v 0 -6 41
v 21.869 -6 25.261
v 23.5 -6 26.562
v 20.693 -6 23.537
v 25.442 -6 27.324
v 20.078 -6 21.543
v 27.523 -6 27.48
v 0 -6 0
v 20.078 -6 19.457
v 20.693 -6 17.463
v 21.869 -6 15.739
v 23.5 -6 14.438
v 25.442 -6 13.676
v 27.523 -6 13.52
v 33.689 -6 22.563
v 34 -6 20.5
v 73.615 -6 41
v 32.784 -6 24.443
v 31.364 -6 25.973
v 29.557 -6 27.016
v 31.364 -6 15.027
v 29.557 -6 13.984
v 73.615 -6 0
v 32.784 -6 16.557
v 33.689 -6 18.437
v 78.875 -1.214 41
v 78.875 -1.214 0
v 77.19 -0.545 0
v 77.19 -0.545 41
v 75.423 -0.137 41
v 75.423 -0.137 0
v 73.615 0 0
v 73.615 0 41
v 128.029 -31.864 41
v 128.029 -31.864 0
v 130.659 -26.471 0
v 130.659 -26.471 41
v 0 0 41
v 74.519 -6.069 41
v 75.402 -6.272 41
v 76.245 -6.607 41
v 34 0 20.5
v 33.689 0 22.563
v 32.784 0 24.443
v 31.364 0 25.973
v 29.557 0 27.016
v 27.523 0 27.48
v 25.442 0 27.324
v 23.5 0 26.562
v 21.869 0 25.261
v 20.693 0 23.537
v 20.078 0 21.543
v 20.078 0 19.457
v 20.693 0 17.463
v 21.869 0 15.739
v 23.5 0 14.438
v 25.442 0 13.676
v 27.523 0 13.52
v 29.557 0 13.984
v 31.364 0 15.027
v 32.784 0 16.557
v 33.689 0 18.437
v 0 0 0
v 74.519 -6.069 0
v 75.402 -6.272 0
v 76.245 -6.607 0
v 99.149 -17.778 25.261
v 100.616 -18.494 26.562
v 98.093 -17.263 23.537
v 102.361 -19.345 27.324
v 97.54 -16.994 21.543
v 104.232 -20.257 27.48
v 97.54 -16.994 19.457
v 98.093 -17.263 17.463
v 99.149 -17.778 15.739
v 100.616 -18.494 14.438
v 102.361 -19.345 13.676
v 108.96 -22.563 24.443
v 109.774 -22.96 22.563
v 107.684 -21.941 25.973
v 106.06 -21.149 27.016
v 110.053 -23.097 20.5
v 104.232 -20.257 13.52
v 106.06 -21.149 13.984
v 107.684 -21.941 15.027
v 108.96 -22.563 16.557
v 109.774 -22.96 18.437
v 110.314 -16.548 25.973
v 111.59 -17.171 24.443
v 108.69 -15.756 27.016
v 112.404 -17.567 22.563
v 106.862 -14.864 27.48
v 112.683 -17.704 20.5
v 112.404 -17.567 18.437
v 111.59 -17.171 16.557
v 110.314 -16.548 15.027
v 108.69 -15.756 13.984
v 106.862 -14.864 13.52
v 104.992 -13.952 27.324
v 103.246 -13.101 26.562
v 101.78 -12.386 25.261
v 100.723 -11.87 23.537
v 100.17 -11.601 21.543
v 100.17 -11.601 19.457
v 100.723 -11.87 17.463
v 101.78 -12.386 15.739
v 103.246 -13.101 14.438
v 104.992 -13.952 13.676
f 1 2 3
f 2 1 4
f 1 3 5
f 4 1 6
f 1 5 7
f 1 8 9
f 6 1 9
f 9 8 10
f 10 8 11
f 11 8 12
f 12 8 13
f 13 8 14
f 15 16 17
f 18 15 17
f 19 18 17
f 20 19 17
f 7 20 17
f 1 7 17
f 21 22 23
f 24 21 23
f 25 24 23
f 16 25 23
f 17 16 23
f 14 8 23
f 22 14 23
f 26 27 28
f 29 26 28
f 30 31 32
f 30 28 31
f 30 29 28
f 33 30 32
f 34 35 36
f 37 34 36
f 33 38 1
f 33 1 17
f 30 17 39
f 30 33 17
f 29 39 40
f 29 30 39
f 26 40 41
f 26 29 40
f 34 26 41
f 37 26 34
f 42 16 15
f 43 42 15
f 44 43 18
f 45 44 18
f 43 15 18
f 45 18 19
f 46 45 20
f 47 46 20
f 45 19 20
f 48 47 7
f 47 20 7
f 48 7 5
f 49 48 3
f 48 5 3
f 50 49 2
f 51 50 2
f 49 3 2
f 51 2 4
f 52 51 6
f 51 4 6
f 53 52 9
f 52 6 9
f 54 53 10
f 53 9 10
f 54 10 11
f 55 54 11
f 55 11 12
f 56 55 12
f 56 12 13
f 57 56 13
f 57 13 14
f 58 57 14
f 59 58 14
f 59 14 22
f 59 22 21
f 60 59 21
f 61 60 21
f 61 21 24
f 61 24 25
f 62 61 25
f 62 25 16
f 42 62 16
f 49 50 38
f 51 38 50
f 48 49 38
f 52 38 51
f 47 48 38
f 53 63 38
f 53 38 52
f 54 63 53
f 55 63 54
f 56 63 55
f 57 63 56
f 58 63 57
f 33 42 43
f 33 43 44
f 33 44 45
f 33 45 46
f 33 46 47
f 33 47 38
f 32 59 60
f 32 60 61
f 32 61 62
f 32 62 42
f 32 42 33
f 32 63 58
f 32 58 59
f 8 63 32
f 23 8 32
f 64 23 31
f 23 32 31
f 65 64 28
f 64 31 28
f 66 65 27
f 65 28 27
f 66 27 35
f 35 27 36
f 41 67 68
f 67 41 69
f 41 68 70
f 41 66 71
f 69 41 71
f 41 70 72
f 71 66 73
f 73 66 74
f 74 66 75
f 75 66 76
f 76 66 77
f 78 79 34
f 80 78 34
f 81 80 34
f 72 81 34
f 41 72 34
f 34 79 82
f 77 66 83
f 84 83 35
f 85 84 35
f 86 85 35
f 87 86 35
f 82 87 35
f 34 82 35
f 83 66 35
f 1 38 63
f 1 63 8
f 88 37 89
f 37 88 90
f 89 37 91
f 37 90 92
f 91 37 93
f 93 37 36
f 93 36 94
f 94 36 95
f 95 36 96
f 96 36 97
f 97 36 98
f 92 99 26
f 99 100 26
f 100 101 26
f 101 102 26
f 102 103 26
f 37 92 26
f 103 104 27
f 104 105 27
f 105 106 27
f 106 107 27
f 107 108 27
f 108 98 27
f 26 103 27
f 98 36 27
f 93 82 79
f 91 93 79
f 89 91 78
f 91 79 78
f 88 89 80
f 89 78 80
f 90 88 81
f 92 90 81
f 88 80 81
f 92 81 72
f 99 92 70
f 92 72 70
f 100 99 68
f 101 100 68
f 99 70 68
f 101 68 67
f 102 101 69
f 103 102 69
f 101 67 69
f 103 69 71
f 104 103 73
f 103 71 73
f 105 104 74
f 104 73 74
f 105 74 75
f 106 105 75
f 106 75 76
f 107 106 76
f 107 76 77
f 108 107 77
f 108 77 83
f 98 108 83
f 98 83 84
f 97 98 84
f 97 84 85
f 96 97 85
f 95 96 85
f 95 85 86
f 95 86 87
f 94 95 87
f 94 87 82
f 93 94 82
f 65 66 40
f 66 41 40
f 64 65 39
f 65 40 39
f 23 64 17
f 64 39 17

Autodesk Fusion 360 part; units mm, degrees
sketch "Sketch1" plane through (0, 0, 0) normal (0, 0, 1) x (1, 0, 0)
  line L0 (0, 0) -> (0, -6)
  line L1 (0, -6) -> (75, -6)
  line L2 (75, -6) -> (128.0288, -31.8639)
  line L3 (128.0288, -31.8639) -> (130.6591, -26.4711)
  line L4 (0, 0) -> (76.3852, 0)
  line L5 (130.6591, -26.4711) -> (76.3852, 0)
  dimension "d9" = 6
  dimension "d10" = 75
  dimension "d11" = 59
  dimension "d12" = 154
  dimension "d13" = 6
extrude "Extrude1" add sketch "Sketch1" along normal blind 41
sketch "Sketch2" plane through (0, -6, 0) normal (0, -1, 0) x (1, 0, 0)
  line L0 (0, 0) -> (75, 0)
  line L1 (75, 0) -> (75, 41)
  line L2 (75, 41) -> (0, 41)
  line L3 (0, 41) -> (0, 0)
  circle A0 centre (27, 20.5) radius 7
  dimension "d16" = 14
  dimension "d17" = 27
  dimension "d18" = 20.5
extrude "Hole1" cut sketch "Sketch2" against normal blind 6 contours A0
sketch "Sketch3" plane through (12.0487, 24.7034, 0) normal (-0.4384, -0.8988, 0) x (0.8988, -0.4384, 0)
  line L0 (70.0398, 0) -> (129.0398, 0)
  line L1 (129.0398, 0) -> (129.0398, 41)
  line L2 (129.0398, 41) -> (70.0398, 41)
  line L3 (70.0398, 41) -> (70.0398, 0)
  circle A0 centre (102.0398, 20.5) radius 7
  dimension "d21" = 14
  dimension "d22" = 27
  dimension "d28" = 20.5
extrude "Hole2" cut sketch "Sketch3" against normal through all contours A0
fillet "Fillet1" radius 6 1 edges at (75, -6, 20.5)
fillet "Fillet1" radius 12 1 edges at (76.3852, 0, 20.5)
